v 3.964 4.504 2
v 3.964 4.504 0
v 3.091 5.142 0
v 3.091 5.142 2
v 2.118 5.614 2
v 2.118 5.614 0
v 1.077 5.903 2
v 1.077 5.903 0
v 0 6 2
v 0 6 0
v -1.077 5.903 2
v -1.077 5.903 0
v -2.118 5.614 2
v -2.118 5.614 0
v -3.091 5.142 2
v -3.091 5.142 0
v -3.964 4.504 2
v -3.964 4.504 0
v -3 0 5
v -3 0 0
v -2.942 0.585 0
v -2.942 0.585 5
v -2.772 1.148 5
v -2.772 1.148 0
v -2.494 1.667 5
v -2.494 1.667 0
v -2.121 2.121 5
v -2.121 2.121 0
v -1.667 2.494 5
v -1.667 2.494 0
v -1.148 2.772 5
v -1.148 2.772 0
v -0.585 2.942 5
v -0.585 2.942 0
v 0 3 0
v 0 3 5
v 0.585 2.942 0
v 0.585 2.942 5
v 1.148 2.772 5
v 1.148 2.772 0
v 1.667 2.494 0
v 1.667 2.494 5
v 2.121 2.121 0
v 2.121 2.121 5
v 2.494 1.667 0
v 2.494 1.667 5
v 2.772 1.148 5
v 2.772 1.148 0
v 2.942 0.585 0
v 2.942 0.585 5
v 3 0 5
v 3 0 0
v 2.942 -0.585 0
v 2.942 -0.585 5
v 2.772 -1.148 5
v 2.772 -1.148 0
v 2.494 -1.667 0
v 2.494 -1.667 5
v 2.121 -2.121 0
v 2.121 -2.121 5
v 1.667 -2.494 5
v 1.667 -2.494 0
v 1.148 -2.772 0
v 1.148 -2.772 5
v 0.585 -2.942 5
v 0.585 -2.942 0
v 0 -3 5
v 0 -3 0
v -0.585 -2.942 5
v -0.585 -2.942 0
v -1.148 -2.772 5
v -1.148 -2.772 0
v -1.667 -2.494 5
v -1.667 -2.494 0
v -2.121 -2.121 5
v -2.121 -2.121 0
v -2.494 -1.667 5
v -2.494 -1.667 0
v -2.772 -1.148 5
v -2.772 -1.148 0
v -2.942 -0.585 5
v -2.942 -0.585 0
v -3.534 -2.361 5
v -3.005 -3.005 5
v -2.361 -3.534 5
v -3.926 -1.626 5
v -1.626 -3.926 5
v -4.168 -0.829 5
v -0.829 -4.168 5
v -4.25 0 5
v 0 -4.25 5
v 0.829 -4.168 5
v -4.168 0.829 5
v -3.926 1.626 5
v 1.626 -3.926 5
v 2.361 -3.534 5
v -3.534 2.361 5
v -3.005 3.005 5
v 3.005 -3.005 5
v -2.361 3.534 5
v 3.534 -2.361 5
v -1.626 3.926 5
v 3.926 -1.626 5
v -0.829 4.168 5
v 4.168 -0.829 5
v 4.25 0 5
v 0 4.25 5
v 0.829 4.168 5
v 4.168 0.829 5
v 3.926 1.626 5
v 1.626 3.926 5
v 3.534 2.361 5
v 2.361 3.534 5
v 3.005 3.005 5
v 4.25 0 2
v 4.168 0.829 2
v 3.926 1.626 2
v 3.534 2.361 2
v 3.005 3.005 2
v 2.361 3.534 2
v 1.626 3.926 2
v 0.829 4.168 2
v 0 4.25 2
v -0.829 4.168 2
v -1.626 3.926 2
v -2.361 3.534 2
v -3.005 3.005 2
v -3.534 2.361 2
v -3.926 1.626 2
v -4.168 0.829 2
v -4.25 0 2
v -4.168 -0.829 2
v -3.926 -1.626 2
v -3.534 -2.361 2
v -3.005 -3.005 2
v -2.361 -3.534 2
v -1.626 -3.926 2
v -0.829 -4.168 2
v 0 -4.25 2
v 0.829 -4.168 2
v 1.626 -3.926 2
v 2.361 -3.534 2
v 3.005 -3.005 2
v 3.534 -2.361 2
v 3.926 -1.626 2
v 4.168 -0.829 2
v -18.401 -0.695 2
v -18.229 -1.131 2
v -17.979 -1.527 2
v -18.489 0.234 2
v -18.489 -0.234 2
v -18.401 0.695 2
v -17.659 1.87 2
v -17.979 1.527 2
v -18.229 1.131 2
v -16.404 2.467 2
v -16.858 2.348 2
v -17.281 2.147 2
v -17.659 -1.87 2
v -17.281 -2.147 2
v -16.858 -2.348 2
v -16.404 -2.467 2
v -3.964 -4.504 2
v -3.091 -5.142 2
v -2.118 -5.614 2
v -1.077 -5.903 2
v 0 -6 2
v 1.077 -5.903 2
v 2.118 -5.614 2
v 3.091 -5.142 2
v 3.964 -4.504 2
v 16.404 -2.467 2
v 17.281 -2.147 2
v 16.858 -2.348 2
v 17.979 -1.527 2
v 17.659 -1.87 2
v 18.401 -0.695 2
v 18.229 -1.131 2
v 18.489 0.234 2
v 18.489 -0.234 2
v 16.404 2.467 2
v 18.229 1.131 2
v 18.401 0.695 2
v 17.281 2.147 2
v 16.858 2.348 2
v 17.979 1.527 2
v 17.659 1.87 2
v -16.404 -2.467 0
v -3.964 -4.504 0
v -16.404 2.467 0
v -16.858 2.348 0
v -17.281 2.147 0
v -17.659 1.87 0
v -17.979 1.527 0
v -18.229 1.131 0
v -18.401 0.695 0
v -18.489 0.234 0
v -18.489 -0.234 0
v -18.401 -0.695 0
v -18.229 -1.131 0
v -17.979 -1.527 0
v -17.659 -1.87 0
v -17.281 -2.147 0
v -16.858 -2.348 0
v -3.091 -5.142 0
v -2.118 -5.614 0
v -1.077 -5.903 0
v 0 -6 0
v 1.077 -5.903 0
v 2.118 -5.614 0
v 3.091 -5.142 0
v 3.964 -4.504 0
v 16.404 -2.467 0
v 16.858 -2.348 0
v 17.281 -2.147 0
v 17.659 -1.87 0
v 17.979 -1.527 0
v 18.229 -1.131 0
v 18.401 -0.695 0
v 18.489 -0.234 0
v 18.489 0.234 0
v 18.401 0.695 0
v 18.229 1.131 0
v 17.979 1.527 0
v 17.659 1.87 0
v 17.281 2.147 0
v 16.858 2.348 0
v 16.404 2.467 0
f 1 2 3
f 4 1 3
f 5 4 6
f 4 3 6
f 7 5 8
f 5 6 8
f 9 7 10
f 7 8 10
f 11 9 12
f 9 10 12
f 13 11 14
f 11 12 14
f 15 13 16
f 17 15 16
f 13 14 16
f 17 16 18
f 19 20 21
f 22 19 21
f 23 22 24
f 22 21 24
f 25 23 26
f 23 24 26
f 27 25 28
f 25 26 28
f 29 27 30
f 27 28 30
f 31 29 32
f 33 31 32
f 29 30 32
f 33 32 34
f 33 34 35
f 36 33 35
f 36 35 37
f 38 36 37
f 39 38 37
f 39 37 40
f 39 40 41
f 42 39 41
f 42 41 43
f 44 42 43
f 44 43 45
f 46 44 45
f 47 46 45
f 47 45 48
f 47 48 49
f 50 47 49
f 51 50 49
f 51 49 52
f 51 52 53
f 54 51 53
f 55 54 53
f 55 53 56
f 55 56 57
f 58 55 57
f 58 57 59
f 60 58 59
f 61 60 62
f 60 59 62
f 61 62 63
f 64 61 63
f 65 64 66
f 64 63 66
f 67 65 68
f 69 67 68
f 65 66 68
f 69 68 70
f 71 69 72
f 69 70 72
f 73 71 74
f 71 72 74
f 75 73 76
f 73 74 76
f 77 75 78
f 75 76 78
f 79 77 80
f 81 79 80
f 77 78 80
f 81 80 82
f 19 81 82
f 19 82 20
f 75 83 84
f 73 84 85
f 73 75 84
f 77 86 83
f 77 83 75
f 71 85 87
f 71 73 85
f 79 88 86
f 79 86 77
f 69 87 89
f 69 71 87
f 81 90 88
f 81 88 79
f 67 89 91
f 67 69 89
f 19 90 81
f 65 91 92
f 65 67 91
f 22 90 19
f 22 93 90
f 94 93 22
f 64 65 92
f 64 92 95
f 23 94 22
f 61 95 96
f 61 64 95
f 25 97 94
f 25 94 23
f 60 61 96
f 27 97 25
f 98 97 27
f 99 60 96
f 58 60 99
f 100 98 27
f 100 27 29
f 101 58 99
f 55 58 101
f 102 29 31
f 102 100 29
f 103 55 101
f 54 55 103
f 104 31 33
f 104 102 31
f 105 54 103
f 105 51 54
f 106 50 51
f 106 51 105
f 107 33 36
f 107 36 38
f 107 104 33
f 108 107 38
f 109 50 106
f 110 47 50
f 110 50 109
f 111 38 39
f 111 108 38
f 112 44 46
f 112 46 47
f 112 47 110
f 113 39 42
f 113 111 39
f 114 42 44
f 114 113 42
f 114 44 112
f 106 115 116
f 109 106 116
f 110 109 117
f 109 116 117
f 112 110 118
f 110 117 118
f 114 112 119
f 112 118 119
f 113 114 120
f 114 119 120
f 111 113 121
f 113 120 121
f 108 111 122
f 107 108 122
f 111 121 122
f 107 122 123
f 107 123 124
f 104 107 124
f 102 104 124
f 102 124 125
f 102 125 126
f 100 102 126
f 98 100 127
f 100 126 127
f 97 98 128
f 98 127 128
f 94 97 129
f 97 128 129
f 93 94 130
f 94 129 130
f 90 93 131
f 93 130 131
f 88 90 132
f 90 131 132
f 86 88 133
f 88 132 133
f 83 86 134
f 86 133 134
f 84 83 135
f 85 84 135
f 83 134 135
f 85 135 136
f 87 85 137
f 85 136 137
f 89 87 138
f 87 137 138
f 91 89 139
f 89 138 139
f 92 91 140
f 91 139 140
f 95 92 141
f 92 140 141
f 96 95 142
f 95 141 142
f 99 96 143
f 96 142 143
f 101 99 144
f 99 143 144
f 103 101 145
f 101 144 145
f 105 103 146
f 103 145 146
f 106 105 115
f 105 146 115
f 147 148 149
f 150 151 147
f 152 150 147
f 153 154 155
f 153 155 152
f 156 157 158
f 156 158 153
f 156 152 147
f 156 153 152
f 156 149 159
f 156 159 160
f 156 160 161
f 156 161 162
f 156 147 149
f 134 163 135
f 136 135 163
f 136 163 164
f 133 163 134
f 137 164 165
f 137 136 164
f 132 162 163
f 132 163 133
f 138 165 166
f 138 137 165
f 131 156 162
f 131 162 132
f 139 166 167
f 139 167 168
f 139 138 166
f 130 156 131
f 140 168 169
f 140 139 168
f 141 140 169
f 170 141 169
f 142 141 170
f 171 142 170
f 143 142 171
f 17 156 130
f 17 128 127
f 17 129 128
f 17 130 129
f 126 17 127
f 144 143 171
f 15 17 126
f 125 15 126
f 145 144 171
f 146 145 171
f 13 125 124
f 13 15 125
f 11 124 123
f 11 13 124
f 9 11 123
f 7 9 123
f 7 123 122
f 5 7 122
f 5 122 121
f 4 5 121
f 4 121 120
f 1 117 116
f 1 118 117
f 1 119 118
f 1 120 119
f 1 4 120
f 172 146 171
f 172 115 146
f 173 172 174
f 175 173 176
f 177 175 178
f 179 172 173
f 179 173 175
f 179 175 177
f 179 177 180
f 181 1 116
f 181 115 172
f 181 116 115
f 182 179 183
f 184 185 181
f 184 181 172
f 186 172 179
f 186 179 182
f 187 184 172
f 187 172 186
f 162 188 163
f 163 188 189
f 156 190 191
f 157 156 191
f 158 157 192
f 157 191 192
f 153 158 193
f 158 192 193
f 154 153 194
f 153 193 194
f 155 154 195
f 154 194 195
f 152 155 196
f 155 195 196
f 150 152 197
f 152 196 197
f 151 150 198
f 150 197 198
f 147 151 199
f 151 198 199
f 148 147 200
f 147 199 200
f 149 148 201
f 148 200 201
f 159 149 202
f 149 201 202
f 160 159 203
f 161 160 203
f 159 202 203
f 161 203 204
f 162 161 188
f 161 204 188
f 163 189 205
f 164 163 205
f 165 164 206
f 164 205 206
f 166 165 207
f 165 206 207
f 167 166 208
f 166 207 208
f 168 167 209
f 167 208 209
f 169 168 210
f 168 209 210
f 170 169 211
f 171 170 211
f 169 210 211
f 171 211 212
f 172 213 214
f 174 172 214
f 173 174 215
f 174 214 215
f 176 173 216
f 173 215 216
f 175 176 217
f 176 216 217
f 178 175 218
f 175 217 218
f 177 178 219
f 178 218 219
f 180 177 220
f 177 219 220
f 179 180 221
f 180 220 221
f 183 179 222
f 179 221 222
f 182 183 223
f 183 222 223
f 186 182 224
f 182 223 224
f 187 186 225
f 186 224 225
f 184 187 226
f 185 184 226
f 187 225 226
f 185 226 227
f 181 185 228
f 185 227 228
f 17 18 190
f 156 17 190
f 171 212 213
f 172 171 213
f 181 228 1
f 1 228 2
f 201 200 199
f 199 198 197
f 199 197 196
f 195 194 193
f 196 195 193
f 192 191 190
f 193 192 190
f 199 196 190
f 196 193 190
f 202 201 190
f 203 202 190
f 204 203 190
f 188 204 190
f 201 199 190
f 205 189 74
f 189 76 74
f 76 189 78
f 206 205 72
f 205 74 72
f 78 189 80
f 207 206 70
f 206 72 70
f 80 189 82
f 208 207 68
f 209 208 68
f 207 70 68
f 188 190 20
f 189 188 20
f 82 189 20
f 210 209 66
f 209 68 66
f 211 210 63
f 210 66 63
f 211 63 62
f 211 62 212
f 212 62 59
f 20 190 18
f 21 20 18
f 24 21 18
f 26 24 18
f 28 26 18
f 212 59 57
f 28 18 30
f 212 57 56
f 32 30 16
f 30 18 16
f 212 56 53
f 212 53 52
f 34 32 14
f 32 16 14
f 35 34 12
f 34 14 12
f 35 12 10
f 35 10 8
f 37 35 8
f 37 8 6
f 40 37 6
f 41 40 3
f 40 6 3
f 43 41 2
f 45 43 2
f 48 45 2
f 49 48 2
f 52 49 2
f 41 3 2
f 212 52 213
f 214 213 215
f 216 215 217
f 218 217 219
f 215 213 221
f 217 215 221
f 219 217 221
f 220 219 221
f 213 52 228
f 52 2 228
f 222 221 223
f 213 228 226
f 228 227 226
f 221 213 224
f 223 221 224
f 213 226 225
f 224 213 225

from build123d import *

# Parameters (mm, degrees)
BOSS_EXTRUDE1_DEPTH = 2
SKETCH2_R           = 4.25
BOSS_EXTRUDE2_DEPTH = 3
CUT_EXTRUDE1_REACH  = 22.081
SKETCH3_R           = 3


with BuildPart() as part:
    # Sketch1 → Boss-Extrude1 (new body)
    with BuildSketch(Plane.XY):
        with BuildLine():
            Line((-3.963767369, 4.504281102), (-16.404004536, 2.467140112))
            ThreePointArc((-16.404004536, 2.467140112), (-18.5, -1e-09), (-16.404004536, -2.467140113))
            Line((-16.404004536, -2.467140113), (-3.963767369, -4.504281102))
            ThreePointArc((-3.963767369, -4.504281102), (0, -6), (3.963767369, -4.504281102))
            Line((3.963767369, -4.504281102), (16.404004536, -2.467140112))
            ThreePointArc((16.404004536, -2.467140112), (18.5, 0), (16.404004536, 2.467140113))
            Line((16.404004536, 2.467140113), (3.963767369, 4.504281102))
            ThreePointArc((3.963767369, 4.504281102), (0, 6), (-3.963767369, 4.504281102))
        make_face()
    extrude(amount=BOSS_EXTRUDE1_DEPTH)

    # Sketch2 → Boss-Extrude2 (add)
    with BuildSketch(Plane.XY.offset(2)):
        Circle(SKETCH2_R)
    extrude(amount=BOSS_EXTRUDE2_DEPTH)

    # Sketch3 → Cut-Extrude1 (cut, up to next)
    with BuildSketch(Plane(origin=(0, 0, 0), x_dir=(-1, 0, 0), z_dir=(0, 0, -1)), mode=Mode.PRIVATE) as cut_extrude1_sk1:
        Circle(SKETCH3_R)
    cut_extrude1_tool1 = extrude(cut_extrude1_sk1.sketch, amount=-CUT_EXTRUDE1_REACH, mode=Mode.PRIVATE) & part.part
    add(cut_extrude1_tool1.solids().sort_by_distance((0, 0, 0))[0], mode=Mode.SUBTRACT)


solid = part.part
